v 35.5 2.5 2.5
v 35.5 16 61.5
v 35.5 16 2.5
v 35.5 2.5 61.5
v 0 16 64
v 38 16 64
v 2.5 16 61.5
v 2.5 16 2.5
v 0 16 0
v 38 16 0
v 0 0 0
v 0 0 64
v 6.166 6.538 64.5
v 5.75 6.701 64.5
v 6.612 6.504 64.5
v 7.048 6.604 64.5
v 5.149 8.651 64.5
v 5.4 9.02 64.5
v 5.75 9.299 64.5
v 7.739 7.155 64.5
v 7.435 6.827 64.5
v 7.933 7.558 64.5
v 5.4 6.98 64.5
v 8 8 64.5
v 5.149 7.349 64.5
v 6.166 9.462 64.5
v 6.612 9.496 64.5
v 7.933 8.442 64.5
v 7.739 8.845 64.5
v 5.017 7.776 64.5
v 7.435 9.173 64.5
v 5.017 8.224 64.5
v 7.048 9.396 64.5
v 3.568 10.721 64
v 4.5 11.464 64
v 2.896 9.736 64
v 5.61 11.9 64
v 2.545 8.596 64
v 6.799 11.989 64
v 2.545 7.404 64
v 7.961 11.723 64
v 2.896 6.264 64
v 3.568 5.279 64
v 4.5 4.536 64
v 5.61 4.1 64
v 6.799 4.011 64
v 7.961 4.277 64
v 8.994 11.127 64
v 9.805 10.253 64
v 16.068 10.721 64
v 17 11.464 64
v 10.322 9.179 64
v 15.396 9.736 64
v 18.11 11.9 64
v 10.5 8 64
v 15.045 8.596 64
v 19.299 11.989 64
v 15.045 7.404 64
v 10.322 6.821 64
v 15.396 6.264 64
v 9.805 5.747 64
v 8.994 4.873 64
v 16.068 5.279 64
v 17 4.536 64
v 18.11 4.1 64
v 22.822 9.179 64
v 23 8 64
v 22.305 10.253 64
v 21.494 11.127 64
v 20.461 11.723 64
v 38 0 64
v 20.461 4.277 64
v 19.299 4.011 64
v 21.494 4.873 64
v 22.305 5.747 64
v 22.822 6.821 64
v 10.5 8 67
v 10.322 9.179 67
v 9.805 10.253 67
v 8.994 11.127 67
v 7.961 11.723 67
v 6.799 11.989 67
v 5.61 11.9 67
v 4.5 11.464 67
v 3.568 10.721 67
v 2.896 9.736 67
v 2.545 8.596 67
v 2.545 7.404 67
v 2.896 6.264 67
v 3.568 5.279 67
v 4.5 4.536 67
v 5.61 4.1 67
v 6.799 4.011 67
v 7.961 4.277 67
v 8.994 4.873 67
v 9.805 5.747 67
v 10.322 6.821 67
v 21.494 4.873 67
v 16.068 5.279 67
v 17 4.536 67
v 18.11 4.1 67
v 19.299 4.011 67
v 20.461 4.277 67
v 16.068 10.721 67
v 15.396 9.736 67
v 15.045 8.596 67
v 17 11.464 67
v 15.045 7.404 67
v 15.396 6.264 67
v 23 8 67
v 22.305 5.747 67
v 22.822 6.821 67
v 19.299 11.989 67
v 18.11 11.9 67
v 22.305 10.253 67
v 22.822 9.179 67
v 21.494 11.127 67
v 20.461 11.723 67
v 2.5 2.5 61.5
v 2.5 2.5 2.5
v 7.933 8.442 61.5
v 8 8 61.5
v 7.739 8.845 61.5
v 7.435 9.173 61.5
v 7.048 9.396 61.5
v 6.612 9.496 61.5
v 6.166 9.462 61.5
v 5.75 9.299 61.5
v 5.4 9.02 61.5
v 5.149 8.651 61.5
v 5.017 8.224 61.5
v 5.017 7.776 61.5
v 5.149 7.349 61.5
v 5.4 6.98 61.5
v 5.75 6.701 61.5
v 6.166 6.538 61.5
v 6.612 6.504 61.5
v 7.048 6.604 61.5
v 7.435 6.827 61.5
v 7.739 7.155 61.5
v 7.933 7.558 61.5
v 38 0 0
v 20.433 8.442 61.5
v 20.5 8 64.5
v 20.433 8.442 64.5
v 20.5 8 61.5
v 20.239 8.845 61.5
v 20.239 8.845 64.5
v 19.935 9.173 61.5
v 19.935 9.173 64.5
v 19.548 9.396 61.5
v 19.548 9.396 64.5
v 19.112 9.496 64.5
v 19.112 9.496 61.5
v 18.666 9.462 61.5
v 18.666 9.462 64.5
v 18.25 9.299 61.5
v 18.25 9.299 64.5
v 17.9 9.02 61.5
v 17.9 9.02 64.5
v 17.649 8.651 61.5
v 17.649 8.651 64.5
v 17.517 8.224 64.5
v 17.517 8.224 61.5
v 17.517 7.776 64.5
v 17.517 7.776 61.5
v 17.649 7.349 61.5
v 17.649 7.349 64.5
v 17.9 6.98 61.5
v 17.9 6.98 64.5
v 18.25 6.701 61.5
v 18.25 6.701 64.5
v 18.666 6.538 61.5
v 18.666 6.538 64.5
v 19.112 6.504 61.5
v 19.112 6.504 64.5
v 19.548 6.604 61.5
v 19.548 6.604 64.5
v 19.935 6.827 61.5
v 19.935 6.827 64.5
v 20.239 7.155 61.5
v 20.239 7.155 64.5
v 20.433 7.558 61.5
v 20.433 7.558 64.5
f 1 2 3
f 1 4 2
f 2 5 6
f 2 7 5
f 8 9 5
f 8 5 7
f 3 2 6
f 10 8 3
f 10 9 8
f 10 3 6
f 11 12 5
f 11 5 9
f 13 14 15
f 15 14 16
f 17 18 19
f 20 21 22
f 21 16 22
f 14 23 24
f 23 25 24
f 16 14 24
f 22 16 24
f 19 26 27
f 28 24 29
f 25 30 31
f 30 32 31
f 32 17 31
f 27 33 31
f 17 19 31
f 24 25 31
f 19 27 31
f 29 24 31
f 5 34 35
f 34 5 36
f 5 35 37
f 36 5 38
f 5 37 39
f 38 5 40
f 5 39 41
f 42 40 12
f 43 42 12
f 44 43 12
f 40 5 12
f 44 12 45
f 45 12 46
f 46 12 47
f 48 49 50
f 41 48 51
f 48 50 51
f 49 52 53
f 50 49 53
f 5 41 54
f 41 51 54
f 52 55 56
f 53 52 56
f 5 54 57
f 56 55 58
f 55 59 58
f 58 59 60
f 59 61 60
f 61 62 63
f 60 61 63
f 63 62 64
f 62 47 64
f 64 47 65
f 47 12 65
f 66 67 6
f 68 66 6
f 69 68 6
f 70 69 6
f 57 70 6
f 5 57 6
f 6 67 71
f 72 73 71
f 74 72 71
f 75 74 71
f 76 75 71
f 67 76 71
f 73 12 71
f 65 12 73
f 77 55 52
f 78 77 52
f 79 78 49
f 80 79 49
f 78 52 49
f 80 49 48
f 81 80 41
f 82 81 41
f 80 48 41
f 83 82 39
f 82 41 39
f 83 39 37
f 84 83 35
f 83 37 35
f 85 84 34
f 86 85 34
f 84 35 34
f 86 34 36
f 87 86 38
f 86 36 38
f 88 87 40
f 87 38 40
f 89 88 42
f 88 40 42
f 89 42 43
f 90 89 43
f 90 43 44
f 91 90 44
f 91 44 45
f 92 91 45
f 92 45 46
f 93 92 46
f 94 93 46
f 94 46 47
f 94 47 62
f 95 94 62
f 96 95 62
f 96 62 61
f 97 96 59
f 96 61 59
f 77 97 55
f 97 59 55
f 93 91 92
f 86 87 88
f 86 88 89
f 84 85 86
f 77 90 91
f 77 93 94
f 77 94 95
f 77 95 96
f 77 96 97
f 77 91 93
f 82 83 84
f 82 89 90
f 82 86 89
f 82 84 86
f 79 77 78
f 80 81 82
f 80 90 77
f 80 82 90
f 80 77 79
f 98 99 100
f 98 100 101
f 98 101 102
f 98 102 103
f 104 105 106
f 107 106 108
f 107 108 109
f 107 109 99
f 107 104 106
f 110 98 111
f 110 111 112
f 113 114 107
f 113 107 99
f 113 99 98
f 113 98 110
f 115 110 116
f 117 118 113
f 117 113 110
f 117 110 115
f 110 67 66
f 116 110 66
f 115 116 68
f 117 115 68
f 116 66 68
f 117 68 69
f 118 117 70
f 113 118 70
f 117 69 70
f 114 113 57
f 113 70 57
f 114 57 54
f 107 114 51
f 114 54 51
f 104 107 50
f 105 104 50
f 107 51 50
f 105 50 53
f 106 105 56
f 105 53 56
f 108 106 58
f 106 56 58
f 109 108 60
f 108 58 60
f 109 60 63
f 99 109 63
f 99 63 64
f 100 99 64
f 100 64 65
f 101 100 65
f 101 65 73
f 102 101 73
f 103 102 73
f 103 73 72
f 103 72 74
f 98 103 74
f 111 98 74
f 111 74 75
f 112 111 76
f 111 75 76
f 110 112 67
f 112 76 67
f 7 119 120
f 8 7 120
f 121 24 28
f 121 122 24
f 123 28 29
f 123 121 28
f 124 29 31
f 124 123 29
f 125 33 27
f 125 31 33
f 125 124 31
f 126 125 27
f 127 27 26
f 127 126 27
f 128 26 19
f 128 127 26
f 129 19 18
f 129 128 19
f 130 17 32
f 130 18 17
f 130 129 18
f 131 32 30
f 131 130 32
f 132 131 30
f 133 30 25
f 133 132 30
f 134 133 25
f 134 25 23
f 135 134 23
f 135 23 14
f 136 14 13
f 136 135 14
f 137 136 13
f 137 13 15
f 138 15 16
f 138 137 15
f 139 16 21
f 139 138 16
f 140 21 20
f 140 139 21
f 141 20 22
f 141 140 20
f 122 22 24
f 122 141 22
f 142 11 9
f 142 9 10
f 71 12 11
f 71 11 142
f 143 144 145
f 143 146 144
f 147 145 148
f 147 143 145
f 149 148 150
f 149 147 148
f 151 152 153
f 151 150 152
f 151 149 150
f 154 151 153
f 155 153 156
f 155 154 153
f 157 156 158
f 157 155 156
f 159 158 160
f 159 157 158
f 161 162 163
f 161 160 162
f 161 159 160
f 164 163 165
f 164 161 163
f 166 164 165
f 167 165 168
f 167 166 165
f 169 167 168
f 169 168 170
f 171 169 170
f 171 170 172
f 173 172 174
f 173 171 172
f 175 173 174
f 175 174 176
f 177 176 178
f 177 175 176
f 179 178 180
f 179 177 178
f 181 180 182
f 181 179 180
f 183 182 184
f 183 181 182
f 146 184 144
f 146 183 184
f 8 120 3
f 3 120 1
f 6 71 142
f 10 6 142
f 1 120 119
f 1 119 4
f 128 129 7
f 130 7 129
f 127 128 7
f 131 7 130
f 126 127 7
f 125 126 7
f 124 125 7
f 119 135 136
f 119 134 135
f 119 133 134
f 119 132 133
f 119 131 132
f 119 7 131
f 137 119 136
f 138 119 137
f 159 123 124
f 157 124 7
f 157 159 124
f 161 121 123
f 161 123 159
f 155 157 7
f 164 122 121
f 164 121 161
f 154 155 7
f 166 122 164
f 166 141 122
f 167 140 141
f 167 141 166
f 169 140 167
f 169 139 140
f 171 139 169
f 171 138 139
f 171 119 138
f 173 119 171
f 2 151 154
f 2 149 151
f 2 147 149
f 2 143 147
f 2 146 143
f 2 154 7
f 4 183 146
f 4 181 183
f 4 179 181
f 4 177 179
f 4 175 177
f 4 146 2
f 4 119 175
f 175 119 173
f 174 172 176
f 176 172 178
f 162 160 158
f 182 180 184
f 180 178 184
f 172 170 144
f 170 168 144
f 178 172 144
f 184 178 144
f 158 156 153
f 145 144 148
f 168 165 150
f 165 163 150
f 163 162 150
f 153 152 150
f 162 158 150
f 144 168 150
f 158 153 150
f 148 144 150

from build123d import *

# Parameters (mm, degrees)
SKETCH1_W           = 38
SKETCH1_H           = 64
BOSS_EXTRUDE1_DEPTH = 16
SKETCH2_R           = 4
BOSS_EXTRUDE2_DEPTH = 3
SHELL1_T            = -2.5


with BuildPart() as part:
    # Sketch1 → Boss-Extrude1 (new body)
    with BuildSketch(Plane(origin=(0, 0, 0), x_dir=(1, 0, 0), z_dir=(0, 1, 0))):
        with Locations((19, -32)):
            Rectangle(SKETCH1_W, SKETCH1_H)
    extrude(amount=BOSS_EXTRUDE1_DEPTH)

    # Sketch2 → Boss-Extrude2 (add)
    with BuildSketch(Plane.XY.offset(64)):
        with Locations((19, 8)):
            Circle(SKETCH2_R)
        with Locations((6.5, 8)):
            Circle(SKETCH2_R)
    extrude(amount=BOSS_EXTRUDE2_DEPTH)

    # Shell1
    shell1_openings = [part.faces().sort_by_distance(p)[0] for p in [
        (19, 16, 32),
    ]]
    offset(amount=SHELL1_T, openings=shell1_openings, kind=Kind.INTERSECTION)


solid = part.part
